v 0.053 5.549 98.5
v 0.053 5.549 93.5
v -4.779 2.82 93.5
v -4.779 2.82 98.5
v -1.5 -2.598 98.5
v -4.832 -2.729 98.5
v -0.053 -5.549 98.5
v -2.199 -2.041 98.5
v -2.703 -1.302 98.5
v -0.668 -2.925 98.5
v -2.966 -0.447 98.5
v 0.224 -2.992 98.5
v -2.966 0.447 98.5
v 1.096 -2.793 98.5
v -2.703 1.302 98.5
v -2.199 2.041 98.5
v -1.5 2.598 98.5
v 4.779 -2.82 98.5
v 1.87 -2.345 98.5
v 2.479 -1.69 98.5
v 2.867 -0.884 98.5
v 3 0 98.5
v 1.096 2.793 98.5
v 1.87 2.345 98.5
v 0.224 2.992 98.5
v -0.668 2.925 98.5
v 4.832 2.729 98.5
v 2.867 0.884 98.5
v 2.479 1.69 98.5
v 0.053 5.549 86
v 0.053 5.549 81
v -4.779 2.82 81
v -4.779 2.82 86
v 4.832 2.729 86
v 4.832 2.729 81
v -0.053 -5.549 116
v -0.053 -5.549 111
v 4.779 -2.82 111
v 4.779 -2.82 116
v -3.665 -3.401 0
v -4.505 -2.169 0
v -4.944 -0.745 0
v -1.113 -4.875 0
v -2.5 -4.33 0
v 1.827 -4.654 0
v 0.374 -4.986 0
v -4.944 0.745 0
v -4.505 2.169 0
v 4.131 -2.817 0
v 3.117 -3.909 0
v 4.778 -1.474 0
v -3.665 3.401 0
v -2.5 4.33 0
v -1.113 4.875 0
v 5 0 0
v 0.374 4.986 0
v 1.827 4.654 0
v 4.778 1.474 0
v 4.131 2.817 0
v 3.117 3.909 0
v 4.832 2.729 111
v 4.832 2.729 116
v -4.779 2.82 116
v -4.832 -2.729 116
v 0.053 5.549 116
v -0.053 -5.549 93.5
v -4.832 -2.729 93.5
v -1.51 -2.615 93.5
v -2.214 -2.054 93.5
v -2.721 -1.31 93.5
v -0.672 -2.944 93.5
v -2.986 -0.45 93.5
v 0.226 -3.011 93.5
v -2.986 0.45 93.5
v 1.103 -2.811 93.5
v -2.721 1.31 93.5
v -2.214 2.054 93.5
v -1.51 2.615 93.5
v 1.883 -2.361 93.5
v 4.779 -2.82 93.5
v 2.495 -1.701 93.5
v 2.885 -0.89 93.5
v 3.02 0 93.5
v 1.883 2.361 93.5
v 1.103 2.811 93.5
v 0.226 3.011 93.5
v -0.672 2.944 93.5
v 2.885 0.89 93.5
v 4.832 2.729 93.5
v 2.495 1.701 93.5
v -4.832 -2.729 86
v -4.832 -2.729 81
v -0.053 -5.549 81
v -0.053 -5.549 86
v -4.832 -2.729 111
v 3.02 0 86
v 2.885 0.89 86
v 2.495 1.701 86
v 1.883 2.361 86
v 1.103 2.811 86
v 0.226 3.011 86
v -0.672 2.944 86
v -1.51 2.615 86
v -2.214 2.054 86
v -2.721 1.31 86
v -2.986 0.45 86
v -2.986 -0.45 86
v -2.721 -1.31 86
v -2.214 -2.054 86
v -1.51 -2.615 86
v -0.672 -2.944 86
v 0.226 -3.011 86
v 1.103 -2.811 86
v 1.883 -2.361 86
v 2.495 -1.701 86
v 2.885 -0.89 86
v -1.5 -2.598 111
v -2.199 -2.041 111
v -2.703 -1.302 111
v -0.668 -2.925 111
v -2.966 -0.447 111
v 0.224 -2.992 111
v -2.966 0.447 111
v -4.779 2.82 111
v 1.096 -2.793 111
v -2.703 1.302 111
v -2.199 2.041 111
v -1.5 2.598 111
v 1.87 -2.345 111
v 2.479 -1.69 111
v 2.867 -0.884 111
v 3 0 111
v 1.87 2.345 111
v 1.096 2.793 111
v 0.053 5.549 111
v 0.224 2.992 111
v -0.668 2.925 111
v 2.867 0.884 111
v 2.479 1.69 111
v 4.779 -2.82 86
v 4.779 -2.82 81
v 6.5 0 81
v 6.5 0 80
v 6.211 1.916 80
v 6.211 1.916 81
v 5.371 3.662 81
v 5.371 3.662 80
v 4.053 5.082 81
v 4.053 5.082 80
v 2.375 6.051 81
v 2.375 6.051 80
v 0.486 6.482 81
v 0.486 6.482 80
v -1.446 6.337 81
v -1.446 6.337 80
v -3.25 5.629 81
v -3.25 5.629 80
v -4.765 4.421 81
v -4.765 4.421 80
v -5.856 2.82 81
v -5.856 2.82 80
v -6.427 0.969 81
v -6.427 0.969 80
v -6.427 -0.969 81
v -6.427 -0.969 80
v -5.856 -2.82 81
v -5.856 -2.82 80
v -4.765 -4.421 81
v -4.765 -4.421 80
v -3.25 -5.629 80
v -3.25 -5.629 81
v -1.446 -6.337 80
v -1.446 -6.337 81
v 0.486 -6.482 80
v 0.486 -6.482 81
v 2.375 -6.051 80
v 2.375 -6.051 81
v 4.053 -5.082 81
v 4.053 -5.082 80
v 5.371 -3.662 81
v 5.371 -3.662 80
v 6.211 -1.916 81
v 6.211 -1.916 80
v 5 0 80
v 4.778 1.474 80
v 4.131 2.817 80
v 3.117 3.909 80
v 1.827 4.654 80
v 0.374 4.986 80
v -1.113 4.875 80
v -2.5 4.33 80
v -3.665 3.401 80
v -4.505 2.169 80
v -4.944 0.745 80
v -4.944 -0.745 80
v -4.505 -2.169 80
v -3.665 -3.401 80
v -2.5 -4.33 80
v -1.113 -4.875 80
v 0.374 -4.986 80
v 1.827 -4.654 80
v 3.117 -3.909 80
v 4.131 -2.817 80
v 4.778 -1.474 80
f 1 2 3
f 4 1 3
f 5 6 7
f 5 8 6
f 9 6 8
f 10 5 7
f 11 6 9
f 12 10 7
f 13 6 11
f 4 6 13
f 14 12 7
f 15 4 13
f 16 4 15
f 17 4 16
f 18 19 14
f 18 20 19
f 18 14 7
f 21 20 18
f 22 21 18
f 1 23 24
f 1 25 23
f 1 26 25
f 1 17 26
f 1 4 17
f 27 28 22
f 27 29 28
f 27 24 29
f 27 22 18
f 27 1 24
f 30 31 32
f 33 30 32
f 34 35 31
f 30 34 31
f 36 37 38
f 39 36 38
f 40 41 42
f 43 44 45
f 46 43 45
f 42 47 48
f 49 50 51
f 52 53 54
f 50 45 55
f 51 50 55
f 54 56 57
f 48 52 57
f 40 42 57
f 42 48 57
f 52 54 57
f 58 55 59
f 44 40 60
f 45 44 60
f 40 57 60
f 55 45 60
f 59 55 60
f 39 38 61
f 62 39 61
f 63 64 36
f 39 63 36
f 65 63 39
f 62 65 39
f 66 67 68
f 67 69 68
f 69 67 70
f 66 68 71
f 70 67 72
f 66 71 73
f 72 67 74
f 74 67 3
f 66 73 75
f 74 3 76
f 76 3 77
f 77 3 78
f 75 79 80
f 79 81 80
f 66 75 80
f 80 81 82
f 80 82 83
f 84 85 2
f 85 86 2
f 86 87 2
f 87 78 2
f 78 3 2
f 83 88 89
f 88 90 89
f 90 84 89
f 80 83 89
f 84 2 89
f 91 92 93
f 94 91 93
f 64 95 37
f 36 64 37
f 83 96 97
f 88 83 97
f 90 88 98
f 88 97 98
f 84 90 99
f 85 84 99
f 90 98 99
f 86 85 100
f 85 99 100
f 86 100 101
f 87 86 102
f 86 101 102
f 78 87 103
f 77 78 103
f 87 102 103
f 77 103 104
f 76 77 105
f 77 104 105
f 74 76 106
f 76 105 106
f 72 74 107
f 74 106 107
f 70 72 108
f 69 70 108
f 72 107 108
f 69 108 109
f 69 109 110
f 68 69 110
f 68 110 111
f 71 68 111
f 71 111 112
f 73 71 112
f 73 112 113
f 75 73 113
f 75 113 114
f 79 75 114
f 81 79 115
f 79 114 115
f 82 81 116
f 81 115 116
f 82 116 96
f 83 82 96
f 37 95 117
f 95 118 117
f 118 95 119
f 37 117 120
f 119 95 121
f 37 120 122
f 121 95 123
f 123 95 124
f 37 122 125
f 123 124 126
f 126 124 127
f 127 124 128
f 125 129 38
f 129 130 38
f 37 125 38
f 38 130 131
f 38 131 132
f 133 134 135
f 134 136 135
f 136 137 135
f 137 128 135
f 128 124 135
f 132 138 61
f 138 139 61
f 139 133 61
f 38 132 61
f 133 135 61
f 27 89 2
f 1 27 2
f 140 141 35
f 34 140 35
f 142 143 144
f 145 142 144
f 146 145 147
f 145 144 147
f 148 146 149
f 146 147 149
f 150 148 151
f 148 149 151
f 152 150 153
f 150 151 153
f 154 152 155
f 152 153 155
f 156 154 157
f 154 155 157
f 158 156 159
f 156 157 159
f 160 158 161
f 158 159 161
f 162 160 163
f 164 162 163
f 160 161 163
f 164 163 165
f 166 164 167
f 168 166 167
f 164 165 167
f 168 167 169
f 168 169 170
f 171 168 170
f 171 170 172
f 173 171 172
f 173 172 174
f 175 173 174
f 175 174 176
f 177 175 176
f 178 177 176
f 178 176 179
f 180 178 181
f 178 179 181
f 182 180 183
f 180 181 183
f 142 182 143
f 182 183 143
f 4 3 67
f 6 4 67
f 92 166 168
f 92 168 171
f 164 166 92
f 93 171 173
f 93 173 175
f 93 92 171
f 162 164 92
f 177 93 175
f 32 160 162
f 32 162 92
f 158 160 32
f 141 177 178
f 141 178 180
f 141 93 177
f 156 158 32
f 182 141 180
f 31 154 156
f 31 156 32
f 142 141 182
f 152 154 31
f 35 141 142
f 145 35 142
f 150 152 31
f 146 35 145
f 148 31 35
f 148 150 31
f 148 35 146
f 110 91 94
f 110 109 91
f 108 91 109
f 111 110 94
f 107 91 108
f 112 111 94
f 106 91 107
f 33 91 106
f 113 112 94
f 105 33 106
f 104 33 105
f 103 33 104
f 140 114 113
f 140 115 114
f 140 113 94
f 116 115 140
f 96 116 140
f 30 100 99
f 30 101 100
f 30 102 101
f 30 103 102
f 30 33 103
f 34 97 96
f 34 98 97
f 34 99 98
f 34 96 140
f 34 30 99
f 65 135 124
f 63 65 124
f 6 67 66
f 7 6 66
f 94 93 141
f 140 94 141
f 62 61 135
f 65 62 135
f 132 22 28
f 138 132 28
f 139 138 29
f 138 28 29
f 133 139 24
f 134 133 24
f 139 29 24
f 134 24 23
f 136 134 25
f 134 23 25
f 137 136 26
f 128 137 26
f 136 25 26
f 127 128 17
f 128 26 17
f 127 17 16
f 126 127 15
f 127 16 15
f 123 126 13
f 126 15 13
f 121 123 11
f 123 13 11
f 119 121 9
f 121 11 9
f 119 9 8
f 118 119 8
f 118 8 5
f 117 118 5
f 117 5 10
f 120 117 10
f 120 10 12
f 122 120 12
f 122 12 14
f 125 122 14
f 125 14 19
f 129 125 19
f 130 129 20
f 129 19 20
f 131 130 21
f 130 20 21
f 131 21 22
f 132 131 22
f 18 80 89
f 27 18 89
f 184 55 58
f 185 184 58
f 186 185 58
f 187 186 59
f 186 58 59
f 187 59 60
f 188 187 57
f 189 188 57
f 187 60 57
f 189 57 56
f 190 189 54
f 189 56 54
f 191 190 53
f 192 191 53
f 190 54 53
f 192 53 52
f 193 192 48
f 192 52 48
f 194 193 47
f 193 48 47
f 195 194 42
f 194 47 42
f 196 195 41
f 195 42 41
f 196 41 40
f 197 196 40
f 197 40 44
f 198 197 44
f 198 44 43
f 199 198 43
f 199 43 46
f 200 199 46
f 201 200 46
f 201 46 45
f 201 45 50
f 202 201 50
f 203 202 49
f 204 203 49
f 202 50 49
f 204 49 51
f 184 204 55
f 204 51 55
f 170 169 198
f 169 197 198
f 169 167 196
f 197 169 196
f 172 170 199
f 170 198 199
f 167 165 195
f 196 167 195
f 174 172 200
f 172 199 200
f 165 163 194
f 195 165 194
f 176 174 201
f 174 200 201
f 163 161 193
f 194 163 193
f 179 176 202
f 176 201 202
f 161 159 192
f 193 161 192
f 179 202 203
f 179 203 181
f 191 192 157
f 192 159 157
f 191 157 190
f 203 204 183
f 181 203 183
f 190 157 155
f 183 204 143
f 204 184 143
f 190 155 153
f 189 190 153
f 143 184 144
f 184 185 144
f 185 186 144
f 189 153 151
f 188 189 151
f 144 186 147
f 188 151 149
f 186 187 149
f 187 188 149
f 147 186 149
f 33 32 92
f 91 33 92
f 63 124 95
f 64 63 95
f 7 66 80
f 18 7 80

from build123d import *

# Parameters (mm, degrees)
SKETCH1_R           = 5
BOSS_EXTRUDE1_DEPTH = 80
SKETCH2_R           = 6.5
BOSS_EXTRUDE2_DEPTH = 1
BOSS_EXTRUDE5_DEPTH = 5
SKETCH6_R           = 3.019653564
BOSS_EXTRUDE6_DEPTH = 7.5
BOSS_EXTRUDE7_DEPTH = 5
SKETCH8_R           = 3
BOSS_EXTRUDE8_DEPTH = 12.5
BOSS_EXTRUDE9_DEPTH = 5


with BuildPart() as part:
    # Sketch1 → Boss-Extrude1 (new body)
    with BuildSketch(Plane.XY):
        Circle(SKETCH1_R)
    extrude(amount=BOSS_EXTRUDE1_DEPTH)

    # Sketch2 → Boss-Extrude2 (add)
    with BuildSketch(Plane.XY.offset(80)):
        Circle(SKETCH2_R)
    extrude(amount=BOSS_EXTRUDE2_DEPTH)

    # Sketch5 → Boss-Extrude5 (add)
    with BuildSketch(Plane.XY.offset(81)):
        Polygon((4.778851136, -2.820156932), (4.831753114, 2.728528019), (0.052901978, 5.548684951), (-4.778851136, 2.820156932), (-4.831753114, -2.728528019), (-0.052901978, -5.548684951), align=None)
    extrude(amount=BOSS_EXTRUDE5_DEPTH)

    # Sketch6 → Boss-Extrude6 (add)
    with BuildSketch(Plane.XY.offset(86)):
        Circle(SKETCH6_R)
    extrude(amount=BOSS_EXTRUDE6_DEPTH)

    # Sketch7 → Boss-Extrude7 (add)
    with BuildSketch(Plane.XY.offset(93.5)):
        Polygon((4.778851136, -2.820156932), (4.831753114, 2.728528019), (0.052901978, 5.548684951), (-4.778851136, 2.820156932), (-4.831753114, -2.728528019), (-0.052901978, -5.548684951), align=None)
    extrude(amount=BOSS_EXTRUDE7_DEPTH)

    # Sketch8 → Boss-Extrude8 (add)
    with BuildSketch(Plane.XY.offset(98.5)):
        Circle(SKETCH8_R)
    extrude(amount=BOSS_EXTRUDE8_DEPTH)

    # Sketch9 → Boss-Extrude9 (add)
    with BuildSketch(Plane.XY.offset(111)):
        Polygon((4.778851136, -2.820156932), (4.831753114, 2.728528019), (0.052901978, 5.548684951), (-4.778851136, 2.820156932), (-4.831753114, -2.728528019), (-0.052901978, -5.548684951), align=None)
    extrude(amount=BOSS_EXTRUDE9_DEPTH)


solid = part.part
